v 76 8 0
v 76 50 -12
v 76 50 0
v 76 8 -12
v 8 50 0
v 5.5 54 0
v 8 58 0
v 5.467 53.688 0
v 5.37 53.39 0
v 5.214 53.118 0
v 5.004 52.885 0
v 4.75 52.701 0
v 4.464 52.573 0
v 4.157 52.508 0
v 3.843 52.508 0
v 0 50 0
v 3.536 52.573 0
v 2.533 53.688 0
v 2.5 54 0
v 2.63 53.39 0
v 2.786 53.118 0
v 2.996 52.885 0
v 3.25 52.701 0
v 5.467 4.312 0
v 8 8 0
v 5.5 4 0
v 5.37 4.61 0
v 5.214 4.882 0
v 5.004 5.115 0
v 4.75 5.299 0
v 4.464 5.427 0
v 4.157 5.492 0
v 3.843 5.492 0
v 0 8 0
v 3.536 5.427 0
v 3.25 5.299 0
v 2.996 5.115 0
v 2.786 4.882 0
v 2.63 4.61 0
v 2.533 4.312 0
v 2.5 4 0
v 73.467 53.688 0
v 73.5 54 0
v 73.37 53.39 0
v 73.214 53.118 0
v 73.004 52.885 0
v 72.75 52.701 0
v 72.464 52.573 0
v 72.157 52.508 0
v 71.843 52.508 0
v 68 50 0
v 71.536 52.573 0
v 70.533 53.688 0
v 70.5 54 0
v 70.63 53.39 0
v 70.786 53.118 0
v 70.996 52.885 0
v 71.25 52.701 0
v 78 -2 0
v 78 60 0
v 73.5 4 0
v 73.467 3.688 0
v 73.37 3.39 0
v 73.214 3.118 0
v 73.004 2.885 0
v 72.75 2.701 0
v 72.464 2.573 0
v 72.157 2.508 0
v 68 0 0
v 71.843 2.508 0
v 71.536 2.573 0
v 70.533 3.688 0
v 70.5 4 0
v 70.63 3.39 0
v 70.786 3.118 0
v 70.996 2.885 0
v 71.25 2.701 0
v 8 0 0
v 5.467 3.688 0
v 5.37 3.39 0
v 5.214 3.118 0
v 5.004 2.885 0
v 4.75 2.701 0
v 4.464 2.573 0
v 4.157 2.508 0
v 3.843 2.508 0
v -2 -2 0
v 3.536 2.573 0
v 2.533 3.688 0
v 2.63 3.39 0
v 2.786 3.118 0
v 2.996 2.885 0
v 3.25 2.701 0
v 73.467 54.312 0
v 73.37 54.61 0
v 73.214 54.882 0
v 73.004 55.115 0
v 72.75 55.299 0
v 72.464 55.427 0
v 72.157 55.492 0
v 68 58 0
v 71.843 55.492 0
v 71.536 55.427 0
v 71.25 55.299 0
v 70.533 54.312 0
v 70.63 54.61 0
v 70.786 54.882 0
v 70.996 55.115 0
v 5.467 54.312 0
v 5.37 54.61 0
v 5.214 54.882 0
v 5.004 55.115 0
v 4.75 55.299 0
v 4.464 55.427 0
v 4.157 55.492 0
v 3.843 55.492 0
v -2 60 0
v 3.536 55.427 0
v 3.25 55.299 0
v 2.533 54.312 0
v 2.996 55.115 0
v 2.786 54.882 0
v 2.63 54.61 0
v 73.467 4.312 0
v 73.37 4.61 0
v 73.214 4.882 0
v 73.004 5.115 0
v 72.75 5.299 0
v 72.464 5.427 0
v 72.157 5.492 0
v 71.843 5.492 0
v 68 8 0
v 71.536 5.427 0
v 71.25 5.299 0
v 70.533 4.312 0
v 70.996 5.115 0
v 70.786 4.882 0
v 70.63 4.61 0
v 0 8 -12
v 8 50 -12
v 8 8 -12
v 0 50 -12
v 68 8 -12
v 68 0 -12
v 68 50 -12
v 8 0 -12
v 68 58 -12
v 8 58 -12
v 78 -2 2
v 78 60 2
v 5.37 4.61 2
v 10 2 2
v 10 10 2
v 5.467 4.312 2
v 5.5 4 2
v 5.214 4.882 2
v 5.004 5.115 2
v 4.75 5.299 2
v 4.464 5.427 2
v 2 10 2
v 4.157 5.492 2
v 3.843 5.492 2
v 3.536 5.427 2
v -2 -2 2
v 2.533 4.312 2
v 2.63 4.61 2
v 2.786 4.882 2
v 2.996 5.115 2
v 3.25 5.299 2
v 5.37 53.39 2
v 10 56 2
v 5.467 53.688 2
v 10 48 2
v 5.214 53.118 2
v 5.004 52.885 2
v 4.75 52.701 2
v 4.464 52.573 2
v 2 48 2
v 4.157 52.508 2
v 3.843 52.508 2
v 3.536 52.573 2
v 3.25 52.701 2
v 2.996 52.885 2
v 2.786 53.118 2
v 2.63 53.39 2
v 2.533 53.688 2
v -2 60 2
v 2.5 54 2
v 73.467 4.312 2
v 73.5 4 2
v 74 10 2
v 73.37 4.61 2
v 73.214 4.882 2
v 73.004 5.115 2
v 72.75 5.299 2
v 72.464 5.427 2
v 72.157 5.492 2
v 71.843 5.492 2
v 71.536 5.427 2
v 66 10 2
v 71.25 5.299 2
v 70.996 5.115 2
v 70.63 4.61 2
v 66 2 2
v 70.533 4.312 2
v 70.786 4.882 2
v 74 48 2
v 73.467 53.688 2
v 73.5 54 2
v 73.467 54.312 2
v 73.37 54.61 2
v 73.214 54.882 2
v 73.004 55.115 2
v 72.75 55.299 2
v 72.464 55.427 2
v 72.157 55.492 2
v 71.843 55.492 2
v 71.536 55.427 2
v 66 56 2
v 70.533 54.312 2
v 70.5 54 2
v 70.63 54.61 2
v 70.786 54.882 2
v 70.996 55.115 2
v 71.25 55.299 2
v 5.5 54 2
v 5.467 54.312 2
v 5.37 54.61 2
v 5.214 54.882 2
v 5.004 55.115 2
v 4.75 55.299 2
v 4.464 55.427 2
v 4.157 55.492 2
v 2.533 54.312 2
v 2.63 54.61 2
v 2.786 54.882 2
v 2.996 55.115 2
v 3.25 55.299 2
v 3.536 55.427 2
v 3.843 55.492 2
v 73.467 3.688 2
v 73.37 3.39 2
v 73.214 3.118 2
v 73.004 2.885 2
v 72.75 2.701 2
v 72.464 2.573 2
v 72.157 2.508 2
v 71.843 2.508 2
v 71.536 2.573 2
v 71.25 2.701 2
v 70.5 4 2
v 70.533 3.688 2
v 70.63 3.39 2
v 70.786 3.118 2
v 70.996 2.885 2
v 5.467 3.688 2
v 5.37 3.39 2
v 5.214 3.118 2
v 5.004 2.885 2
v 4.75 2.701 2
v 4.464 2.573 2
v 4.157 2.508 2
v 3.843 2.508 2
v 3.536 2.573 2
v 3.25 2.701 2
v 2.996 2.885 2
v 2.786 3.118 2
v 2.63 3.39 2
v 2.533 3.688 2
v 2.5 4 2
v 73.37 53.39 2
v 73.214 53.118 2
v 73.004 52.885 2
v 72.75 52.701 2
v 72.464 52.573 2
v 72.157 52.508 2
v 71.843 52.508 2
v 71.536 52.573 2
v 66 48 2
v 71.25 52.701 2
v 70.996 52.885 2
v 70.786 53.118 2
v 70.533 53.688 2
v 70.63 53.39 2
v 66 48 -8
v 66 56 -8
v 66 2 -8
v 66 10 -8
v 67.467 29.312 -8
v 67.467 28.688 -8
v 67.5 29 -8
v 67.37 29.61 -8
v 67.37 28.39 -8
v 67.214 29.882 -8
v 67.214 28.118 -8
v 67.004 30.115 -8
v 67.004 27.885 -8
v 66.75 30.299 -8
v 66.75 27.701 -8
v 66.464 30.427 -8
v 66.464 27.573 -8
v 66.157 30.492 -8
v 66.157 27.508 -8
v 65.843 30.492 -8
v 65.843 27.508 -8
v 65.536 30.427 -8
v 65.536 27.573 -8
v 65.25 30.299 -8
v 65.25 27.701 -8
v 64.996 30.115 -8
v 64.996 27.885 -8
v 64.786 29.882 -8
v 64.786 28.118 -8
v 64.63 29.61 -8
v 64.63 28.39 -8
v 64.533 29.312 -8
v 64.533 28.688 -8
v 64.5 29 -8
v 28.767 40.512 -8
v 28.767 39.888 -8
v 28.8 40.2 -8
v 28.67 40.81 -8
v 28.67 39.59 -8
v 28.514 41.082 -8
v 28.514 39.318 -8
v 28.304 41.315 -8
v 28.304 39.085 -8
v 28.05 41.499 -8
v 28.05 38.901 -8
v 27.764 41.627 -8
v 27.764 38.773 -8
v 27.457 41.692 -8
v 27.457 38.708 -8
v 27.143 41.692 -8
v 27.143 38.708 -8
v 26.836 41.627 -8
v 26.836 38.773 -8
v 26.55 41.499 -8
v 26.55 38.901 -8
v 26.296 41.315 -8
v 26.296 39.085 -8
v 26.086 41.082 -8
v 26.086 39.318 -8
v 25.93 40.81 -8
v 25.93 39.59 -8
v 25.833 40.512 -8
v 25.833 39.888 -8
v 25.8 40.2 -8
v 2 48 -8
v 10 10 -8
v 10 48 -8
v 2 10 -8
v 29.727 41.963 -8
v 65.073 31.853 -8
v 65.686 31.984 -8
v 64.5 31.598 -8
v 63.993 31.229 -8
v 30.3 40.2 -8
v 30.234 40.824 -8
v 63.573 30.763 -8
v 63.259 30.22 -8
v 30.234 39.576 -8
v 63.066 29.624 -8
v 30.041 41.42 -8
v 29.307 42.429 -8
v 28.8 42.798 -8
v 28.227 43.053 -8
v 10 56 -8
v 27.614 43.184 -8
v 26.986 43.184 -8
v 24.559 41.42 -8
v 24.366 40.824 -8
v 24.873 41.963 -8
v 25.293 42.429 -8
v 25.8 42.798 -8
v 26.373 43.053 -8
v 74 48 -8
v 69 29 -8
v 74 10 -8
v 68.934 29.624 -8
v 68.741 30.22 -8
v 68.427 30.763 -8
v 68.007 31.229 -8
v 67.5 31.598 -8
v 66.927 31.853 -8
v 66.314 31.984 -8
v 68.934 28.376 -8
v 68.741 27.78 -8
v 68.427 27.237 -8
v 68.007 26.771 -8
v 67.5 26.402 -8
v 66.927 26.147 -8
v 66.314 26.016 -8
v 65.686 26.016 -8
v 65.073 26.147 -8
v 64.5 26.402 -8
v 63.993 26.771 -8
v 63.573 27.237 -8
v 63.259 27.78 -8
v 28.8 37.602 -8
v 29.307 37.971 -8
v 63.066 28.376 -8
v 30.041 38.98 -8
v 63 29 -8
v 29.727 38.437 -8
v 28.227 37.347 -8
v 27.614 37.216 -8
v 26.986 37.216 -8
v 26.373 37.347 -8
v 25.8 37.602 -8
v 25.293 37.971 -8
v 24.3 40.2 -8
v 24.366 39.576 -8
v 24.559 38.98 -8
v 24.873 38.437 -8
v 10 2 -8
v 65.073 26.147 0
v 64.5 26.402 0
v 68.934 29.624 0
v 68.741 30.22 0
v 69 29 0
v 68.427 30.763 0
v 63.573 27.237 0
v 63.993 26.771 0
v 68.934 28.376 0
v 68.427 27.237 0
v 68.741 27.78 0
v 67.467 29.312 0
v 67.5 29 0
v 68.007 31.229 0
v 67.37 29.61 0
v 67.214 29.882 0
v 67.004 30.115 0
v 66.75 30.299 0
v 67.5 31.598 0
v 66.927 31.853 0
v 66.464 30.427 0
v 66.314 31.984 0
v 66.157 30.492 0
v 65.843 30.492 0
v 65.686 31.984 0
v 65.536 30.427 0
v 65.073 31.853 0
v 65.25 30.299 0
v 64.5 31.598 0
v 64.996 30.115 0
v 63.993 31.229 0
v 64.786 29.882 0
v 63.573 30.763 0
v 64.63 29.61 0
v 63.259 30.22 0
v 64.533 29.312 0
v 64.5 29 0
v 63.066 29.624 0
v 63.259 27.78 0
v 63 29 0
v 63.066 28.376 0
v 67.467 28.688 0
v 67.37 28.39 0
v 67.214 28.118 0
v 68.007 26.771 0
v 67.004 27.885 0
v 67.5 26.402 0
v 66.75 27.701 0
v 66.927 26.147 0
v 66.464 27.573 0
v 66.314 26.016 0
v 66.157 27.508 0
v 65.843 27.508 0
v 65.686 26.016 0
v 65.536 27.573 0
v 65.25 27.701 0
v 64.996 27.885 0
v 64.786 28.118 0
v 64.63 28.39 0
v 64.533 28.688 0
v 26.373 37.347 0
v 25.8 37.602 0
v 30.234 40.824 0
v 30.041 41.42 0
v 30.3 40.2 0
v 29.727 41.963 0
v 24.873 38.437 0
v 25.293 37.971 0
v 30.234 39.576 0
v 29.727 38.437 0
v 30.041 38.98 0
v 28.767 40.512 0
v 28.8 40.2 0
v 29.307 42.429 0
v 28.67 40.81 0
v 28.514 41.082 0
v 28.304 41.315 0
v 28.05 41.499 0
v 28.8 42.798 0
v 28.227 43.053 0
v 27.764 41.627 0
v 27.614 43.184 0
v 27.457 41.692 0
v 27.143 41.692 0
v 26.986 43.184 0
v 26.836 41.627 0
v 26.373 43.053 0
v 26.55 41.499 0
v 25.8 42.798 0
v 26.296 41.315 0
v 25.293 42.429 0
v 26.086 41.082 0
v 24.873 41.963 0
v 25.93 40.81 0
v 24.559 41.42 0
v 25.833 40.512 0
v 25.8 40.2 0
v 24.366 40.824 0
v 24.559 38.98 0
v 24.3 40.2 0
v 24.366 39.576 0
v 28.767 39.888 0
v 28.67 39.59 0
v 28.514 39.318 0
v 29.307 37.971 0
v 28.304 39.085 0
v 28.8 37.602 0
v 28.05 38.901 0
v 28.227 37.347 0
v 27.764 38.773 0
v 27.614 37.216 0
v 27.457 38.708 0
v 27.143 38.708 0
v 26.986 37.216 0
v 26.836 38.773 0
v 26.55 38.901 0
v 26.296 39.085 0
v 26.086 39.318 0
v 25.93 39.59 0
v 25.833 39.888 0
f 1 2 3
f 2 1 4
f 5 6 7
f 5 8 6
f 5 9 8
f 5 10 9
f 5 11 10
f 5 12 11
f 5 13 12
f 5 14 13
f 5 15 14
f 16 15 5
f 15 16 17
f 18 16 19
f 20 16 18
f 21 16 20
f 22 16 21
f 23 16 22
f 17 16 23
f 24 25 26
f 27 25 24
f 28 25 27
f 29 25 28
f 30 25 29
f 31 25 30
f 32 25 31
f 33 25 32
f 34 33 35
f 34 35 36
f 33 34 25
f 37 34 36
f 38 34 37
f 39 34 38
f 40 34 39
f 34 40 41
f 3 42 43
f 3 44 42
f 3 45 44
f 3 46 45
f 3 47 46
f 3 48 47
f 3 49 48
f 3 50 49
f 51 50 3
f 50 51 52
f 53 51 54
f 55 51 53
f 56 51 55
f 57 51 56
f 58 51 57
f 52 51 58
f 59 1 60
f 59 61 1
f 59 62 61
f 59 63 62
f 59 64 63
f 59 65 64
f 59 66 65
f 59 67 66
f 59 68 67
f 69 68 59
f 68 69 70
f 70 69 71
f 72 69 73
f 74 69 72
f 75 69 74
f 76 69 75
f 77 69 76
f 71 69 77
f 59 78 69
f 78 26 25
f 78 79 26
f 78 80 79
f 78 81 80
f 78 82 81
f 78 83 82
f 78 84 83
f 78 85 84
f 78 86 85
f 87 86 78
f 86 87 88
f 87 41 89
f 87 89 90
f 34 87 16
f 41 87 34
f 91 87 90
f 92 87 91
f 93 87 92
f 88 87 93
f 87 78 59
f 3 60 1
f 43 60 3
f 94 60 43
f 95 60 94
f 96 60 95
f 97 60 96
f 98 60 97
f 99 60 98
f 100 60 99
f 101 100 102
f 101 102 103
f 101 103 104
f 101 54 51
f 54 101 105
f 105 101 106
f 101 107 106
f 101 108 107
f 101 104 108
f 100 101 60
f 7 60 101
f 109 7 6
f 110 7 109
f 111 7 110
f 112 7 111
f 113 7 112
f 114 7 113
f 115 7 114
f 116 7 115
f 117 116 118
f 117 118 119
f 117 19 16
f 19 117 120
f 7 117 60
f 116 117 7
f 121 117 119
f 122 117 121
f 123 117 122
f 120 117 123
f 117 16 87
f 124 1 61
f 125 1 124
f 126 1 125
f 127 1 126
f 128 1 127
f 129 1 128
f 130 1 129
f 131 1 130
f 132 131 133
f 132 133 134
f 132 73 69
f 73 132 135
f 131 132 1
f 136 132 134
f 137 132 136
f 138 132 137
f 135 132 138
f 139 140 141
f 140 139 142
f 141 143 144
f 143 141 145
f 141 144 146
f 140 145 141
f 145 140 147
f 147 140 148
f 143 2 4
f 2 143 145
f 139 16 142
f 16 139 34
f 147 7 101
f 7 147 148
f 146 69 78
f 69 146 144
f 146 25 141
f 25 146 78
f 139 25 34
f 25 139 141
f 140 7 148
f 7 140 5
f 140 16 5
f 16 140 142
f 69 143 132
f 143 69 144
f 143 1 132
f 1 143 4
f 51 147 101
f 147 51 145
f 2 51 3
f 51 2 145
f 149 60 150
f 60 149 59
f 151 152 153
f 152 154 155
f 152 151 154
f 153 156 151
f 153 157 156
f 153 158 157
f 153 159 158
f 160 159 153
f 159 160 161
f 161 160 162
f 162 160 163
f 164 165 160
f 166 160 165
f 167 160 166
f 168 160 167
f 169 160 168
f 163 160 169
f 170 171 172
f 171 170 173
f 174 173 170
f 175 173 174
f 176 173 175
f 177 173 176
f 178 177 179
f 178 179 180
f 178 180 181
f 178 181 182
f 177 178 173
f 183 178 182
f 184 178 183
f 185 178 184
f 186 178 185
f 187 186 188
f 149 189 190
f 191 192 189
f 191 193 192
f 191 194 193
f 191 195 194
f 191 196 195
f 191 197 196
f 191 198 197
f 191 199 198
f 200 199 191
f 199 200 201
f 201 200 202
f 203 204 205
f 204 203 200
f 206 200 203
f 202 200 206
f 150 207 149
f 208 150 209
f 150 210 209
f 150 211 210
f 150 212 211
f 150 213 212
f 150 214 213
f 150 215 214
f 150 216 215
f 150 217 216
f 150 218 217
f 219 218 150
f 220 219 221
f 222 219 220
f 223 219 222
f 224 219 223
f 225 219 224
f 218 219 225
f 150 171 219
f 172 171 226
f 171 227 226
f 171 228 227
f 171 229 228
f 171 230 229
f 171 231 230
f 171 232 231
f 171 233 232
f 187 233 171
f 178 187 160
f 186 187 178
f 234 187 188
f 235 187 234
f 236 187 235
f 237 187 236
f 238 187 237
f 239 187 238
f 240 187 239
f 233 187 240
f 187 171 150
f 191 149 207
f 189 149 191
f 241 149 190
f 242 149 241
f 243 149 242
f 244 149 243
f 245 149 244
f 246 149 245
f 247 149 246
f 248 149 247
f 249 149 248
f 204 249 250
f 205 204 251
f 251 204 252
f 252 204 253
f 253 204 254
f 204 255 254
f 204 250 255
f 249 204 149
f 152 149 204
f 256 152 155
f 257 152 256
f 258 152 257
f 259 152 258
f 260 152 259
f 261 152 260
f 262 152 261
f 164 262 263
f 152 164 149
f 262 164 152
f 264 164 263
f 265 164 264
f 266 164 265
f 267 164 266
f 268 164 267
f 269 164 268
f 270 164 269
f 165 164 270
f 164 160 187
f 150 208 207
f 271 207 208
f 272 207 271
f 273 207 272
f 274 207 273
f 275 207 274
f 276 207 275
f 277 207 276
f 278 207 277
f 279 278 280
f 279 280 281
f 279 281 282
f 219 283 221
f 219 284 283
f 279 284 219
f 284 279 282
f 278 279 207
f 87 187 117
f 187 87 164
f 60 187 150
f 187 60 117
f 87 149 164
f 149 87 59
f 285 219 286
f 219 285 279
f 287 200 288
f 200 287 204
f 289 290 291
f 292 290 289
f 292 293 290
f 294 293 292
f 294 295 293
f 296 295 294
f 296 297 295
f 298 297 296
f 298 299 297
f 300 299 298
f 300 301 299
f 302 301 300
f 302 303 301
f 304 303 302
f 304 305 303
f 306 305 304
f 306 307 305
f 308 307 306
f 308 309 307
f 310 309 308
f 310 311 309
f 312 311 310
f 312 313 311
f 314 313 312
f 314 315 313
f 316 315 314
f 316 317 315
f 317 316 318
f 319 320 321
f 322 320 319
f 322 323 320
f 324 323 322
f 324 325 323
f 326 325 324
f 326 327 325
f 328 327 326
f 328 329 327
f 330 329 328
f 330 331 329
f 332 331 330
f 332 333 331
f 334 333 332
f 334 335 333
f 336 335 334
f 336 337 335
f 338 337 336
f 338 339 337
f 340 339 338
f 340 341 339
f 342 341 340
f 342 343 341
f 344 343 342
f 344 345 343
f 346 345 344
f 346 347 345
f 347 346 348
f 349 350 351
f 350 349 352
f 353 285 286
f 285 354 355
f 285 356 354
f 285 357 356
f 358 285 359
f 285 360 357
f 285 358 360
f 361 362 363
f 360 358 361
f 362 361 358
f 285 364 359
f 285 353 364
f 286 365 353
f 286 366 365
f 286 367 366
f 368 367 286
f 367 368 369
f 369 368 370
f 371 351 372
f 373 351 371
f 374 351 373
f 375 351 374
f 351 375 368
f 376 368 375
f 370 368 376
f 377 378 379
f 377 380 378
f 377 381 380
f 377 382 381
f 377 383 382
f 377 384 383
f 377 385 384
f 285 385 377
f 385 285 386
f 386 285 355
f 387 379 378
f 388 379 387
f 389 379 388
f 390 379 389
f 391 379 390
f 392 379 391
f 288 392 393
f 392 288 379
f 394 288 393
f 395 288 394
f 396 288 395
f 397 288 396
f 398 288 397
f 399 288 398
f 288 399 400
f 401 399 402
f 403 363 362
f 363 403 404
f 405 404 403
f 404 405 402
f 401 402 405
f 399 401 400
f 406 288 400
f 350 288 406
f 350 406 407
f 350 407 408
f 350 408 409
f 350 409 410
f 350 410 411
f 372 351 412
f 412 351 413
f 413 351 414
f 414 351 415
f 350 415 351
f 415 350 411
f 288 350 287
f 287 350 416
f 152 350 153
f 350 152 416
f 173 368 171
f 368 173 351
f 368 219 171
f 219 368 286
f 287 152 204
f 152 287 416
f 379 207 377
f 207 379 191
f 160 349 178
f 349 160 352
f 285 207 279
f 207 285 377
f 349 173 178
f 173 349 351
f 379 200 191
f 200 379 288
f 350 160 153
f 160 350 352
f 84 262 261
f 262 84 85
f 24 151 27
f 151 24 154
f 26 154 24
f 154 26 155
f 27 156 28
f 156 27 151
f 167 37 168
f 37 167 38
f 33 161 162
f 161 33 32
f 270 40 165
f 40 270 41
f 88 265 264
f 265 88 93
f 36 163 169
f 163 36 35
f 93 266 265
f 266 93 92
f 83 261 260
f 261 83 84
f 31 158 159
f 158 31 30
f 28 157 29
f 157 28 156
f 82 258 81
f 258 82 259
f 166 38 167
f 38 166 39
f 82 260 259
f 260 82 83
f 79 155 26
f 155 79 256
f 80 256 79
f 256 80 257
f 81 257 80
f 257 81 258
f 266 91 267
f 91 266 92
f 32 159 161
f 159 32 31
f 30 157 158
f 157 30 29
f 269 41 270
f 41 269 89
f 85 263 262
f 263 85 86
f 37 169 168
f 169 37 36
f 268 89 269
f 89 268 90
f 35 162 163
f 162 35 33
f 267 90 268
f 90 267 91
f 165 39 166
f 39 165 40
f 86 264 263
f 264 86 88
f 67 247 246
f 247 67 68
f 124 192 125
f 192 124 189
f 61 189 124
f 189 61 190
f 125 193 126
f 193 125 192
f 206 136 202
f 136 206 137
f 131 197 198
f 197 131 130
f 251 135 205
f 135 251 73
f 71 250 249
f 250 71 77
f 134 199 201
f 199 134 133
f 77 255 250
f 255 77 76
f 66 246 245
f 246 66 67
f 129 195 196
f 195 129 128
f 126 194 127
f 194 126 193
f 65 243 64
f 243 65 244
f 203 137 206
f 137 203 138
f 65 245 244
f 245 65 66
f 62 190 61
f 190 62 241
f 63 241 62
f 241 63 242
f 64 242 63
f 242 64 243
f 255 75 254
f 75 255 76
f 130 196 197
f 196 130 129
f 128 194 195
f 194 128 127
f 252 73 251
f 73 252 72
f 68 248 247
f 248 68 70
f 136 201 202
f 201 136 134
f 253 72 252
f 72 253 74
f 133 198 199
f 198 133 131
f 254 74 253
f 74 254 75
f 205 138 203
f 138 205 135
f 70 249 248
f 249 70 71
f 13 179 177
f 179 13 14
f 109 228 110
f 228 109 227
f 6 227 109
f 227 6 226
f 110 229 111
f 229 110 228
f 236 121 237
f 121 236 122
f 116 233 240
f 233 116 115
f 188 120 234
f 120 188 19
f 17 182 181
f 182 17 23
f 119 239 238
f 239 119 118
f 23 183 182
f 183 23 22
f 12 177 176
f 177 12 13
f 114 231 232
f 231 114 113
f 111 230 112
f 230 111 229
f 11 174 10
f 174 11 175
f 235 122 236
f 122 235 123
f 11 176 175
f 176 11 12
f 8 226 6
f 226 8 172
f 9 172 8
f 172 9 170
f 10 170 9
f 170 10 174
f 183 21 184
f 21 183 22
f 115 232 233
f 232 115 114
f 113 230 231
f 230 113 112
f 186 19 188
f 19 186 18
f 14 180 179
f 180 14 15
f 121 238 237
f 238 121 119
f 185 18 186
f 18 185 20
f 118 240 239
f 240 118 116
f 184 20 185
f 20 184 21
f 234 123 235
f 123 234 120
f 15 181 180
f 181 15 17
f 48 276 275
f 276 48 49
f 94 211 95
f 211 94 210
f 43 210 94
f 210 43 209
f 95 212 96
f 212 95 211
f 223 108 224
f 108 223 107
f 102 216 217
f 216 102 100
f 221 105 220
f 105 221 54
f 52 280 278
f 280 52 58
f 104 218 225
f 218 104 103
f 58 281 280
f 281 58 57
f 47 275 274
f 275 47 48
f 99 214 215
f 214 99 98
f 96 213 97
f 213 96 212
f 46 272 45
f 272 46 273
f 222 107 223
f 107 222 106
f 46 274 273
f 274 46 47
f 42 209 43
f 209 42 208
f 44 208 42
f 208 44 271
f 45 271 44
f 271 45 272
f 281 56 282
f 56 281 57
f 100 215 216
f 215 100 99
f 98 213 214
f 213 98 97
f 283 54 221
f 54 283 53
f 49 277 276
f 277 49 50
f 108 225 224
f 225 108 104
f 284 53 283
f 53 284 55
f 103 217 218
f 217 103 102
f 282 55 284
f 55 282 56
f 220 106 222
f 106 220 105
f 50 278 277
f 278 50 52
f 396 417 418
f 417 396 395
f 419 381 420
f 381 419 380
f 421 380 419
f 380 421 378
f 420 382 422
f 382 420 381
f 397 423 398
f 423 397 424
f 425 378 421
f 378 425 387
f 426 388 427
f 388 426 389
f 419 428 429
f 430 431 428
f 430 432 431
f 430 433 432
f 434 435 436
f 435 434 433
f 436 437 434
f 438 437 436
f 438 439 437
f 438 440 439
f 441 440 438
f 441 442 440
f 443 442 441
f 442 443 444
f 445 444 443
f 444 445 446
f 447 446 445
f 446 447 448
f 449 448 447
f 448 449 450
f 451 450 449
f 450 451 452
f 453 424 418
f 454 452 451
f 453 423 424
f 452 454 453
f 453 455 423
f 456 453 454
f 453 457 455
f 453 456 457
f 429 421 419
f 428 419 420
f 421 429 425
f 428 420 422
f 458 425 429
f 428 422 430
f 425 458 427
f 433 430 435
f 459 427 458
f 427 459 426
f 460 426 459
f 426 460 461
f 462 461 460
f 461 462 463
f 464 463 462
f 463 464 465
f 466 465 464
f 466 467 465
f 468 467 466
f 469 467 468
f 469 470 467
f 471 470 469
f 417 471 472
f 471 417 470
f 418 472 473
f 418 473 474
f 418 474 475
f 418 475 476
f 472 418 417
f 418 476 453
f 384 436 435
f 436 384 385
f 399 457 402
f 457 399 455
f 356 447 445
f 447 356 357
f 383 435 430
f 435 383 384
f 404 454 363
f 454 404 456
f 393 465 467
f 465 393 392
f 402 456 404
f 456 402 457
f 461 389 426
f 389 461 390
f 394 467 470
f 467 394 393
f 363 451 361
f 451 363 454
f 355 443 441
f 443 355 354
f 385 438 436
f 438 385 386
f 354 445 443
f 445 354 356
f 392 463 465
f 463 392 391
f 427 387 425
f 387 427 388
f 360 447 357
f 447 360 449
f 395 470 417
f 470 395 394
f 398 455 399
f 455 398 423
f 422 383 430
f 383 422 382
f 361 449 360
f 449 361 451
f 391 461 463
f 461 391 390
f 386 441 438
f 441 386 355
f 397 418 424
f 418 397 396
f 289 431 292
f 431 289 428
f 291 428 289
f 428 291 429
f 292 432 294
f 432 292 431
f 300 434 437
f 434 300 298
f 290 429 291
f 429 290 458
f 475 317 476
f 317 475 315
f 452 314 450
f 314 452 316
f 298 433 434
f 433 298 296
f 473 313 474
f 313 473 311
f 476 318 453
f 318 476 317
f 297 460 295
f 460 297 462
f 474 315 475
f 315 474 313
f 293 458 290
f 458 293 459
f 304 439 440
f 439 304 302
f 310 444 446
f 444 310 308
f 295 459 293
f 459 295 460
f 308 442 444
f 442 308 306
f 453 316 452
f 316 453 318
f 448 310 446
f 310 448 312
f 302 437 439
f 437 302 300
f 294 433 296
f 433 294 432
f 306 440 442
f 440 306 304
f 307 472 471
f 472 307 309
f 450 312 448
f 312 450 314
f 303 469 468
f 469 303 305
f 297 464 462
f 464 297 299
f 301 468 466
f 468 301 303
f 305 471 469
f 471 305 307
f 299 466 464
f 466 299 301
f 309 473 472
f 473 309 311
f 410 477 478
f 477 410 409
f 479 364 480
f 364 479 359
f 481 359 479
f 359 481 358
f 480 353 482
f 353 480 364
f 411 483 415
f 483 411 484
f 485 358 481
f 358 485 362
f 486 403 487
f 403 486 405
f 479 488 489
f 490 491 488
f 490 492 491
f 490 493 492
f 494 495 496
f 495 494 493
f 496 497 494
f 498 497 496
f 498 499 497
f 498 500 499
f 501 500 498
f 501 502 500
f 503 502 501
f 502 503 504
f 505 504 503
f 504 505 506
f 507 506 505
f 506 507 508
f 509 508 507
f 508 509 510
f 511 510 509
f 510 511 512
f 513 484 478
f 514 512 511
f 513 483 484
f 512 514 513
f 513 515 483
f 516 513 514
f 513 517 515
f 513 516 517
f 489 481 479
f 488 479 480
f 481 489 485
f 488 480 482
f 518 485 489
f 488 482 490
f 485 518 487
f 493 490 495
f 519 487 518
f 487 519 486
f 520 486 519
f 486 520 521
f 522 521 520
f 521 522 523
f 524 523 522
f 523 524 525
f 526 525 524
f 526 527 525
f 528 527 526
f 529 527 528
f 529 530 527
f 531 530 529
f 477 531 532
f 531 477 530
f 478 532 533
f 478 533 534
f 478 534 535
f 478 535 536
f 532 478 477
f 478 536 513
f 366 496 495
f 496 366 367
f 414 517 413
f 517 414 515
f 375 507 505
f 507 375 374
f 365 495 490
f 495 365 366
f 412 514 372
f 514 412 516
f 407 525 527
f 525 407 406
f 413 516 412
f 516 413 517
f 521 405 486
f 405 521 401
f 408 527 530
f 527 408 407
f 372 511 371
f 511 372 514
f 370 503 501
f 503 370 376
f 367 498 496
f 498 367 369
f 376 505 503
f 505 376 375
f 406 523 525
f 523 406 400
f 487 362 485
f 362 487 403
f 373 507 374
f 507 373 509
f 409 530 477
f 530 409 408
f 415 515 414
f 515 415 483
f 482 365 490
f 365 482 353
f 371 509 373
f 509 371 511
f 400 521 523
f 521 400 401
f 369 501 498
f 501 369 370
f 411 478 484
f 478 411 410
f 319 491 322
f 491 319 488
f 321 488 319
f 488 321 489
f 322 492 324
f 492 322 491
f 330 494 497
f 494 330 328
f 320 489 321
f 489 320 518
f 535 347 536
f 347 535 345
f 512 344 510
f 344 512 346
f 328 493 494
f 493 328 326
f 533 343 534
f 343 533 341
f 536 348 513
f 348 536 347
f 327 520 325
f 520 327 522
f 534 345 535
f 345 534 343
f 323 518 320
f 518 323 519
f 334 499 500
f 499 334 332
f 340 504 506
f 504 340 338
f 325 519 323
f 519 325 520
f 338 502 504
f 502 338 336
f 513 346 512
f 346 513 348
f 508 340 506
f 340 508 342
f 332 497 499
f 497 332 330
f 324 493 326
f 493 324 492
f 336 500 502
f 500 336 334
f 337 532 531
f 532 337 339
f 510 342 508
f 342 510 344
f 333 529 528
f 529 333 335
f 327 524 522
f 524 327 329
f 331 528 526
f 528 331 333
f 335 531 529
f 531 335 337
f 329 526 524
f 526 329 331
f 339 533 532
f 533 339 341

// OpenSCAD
/*
 * tray for holding Maestro 24 on top cutout of Phoenix frame
 */

renderRim = true;
renderBox = true;
renderBoard = false;

cornerInset = 8;          // 7.8;
innerX = 60;                // 60.8;
innerY =  42;               // 42.8;

outerX = innerX + 2 * cornerInset;
outerY = innerY + 2 * cornerInset;

lipWidth = 2;
rimHeight = 2;
trayDepth = 10;
trayBottomThickness = 2;
trayWallThickness = 2;

// Maestro-24 PCB
boardX = 59;
boardY = 28;
boardThickness = 2;
boardOffsetX = 10;      // from origin of tray  
boardOffsetY = (outerY - boardY) / 2 ;

screwDiameter = 3;

standoffHeight = trayDepth - boardThickness - (renderRim ? 0 : rimHeight);

echo("standoffHeight", standoffHeight);

//
// 
//
module corneredTray() {
    color("pink") 
    if (renderBox)
        difference() {
        
        // the box
        translate([0,0,-(trayDepth + trayBottomThickness)])
            cube([outerX, outerY, trayDepth + trayBottomThickness]);
        
        // cut out corners
        translate([-1,-1,-(trayDepth + trayBottomThickness + 1)])
            cube([cornerInset+1, cornerInset+1, 2 * trayDepth]);
        translate([-1, outerY - cornerInset ,-(trayDepth + trayBottomThickness + 1)])
            cube([cornerInset+1, cornerInset+1, 2 * trayDepth]);
        translate([outerX - cornerInset,-1,-(trayDepth + trayBottomThickness + 1)])
            cube([cornerInset+1, cornerInset+1, 2 * trayDepth]);
        translate([outerX - cornerInset, outerY - cornerInset ,-(trayDepth + trayBottomThickness + 1)])
            cube([cornerInset+1, cornerInset+1, 2 * trayDepth]);
        
    }
    
    // the rim on top of the box
    if (renderRim)
        translate([-lipWidth, -lipWidth, 0]) 
            cube([outerX + 2*lipWidth, outerY + 2*lipWidth, rimHeight]);
        
}

module fullTrayShell() {
    difference() {
        corneredTray();
        
        // cut out inner horizontal
        translate([cornerInset + trayWallThickness, trayWallThickness,-(trayDepth-trayBottomThickness)])
           color("red") cube([outerX - 2*cornerInset - 2*trayWallThickness, 
                 outerY -  2*trayWallThickness, 
                 trayDepth+ rimHeight +1]);
        
        // cut out inner vertical
        translate([trayWallThickness, cornerInset + trayWallThickness,-(trayDepth - trayBottomThickness)])
           color("blue") cube([outerX - 2*trayWallThickness, 
                 outerY - 2*cornerInset - 2*trayWallThickness, 
                 trayDepth + rimHeight + 1]);

    }
}


module screwHole() {
    cylinder(r=1.5, h= 2 * (trayDepth + trayBottomThickness), $fn=30);
}

module screwHoles() {
    translate([cornerInset/2, cornerInset/2, -(trayDepth + trayBottomThickness + 1)])
        screwHole();
    translate([outerX - cornerInset/2, cornerInset/2, -(trayDepth + trayBottomThickness + 1)])
        screwHole();
    translate([cornerInset/2, outerY - cornerInset/2, -(trayDepth + trayBottomThickness + 1)])
        screwHole();
    translate([outerX  - cornerInset/2, outerY - cornerInset/2, -(trayDepth + trayBottomThickness + 1)])
        screwHole();
}

module standoff() {
    difference() {
        cylinder(r = screwDiameter, h = standoffHeight, $fn=30);
        screwHole();
    }
}

module standoffs() {
    // ???
    color("blue") 
    translate([boardOffsetX + (boardX - 3), 
                boardOffsetY + 14, 
                -(trayDepth - trayBottomThickness)])
        standoff();
    color("red")
    translate([17.3 + boardOffsetX, 
            boardOffsetY + (boardY - 2.8), 
            -(trayDepth - trayBottomThickness)])
        standoff();
}



// translate([boardOffsetX, boardOffsetY, -(trayDepth - standoffHeight)])
//    board();

// board simulation
module unmountedBoard() {
    
    union() {
    // pcb
    %color("green") 
        cube([boardX, boardY, boardThickness]);
    
    // servo plugs
    translate([0,0,boardThickness])
        color("yellow")
            cube([boardX,8,15]);
    translate([0, 8,boardThickness])
        color("yellow")
            cube([8, boardY-8, 15]); 
    translate([5, 2, 15 + boardThickness])
        color("black")
            text(size = 4, "servo connectors");
     
    // usb
    translate([boardX-10, 18, boardThickness]) {
        color("black") 
            cube([35, 10, 15]);
        translate([6,4,15])
            color("white") 
                text(size=4, "usb");
    }
}
}

module board() {
    difference() {
        unmountedBoard();
        translate([boardX - 3, 14, -5])
            screwHole();
        translate([17.3, boardY - 2.8, -5])
            screwHole();
    }
 
}

module supports() {
    translate([-lipWidth, -lipWidth, -(trayDepth + trayBottomThickness)]) 
        color("black") 
        support(cornerInset+lipWidth-1, cornerInset+lipWidth-1,  trayDepth + trayBottomThickness);
    translate([outerX - cornerInset, -lipWidth, -(trayDepth + trayBottomThickness)])
        color("blue") 
        support(cornerInset+lipWidth-1, cornerInset+lipWidth-1,  trayDepth + trayBottomThickness);
   
    translate([-lipWidth, outerY - cornerInset + 1,-(trayDepth + trayBottomThickness)])
        color("green") 
        support(cornerInset+lipWidth-1, cornerInset+lipWidth-2,  trayDepth + trayBottomThickness);
    translate([outerX - cornerInset, outerY - cornerInset +1,-(trayDepth + trayBottomThickness)])
        color("red") 
        support(cornerInset+lipWidth-1, cornerInset+lipWidth-1,  trayDepth + trayBottomThickness);
    
    translate([cornerInset , -lipWidth, -(trayDepth + trayBottomThickness)])
        color("orange")
        support(innerX -1,  lipWidth - 1, trayDepth + trayBottomThickness);
     translate([cornerInset , outerY, -(trayDepth + trayBottomThickness)])
        color("orange")
        support(innerX -1,  lipWidth - 1, trayDepth + trayBottomThickness);
     translate([-lipWidth , cornerInset, -(trayDepth + trayBottomThickness)])
        color("orange")
        support(lipWidth -1,  innerY- 1, trayDepth + trayBottomThickness);
     translate([outerX  - cornerInset + lipWidth*2 , cornerInset, -(trayDepth + trayBottomThickness)])
        color("orange")
        support(lipWidth -1,  innerY- 1, trayDepth + trayBottomThickness);
}    

//supports();

supportStepX = 1;
supportStepY = 1;
supportBumpRadius = .5;

// 
// support is made up of narrow towers with little balls on them
// parameters represent x,y,z extents of structure
module support(supportX, supportY, supportZ) {
    
    numSupports = round(supportY / supportStepY);
    bumpStep = round(supportX / (.5 + supportBumpRadius*2));
    bumpOffset = supportX/(supportBumpRadius*2);
    
    echo("support: ", bumpOffset, numSupports, " : ", supportX, supportY, supportZ);
        
    
    for (offset = [0 : supportStepY *2 : numSupports]) {
        echo ("step: ", offset);
        translate([supportBumpRadius, offset, 0]) {
            color("violet") 
                cube([supportX, supportStepY, supportZ - supportBumpRadius]);
            for (x = [supportBumpRadius +.5 : 2*supportBumpRadius +.5 : supportX - supportBumpRadius/2]) {
                translate([x,supportStepY/2, supportZ - supportBumpRadius])
                    sphere(r=supportBumpRadius, $fn=16);
            }
        }
    }
    
}

//
// check any constraints 
//

clearanceLeft = 6.0;
screwDistanceX = 68;
cableHoleClearance = 14;

module validate() {
    

    // left side rim fouls chassis bolt: 6mm max from left screw centers
    actualClearanceLeft = (lipWidth + cornerInset/2);
    if (actualClearanceLeft > clearanceLeft) {
        echo(str("<b>Left clearance is ", actualClearanceLeft, " but must be less than ", clearanceLeft, "</b>"));
    }
    
    actualScrewDistanceX = outerX - cornerInset;
    if (actualScrewDistanceX != screwDistanceX) {
        echo(str("<b>Screw holes X are ", actualScrewDistanceX, " apart but should be ", screwDistanceX, "</b>"));
    }

    if (boardOffsetY < cableHoleClearance) {
        echo(str("<b>Cable hole clearance is ", boardOffsetY, " but should be ", cableHoleClearance, "</b>"));
    }

    if (boardOffsetY + boardY  < outerY - cableHoleClearance - trayWallThickness) {
        echo(str("<b>Cable hole upper clearance is ", boardOffsetY, " but should be ", cableHoleClearance, "</b>"));
    }
}


//
// main begins
//
validate();

difference() {

    fullTrayShell();
    screwHoles();

}


if (renderBox)
    standoffs();


if (renderBoard)
    translate([boardOffsetX, boardOffsetY, -(trayDepth - trayBottomThickness - standoffHeight)])
        board();

// metrics
// translate([cornerInset/2,-10, 0])
//    cube([innerX+cornerInset, 1, 1]);

// translate([-10, cornerInset/2, 0])
//    cube([1, innerY+cornerInset, 1]);
